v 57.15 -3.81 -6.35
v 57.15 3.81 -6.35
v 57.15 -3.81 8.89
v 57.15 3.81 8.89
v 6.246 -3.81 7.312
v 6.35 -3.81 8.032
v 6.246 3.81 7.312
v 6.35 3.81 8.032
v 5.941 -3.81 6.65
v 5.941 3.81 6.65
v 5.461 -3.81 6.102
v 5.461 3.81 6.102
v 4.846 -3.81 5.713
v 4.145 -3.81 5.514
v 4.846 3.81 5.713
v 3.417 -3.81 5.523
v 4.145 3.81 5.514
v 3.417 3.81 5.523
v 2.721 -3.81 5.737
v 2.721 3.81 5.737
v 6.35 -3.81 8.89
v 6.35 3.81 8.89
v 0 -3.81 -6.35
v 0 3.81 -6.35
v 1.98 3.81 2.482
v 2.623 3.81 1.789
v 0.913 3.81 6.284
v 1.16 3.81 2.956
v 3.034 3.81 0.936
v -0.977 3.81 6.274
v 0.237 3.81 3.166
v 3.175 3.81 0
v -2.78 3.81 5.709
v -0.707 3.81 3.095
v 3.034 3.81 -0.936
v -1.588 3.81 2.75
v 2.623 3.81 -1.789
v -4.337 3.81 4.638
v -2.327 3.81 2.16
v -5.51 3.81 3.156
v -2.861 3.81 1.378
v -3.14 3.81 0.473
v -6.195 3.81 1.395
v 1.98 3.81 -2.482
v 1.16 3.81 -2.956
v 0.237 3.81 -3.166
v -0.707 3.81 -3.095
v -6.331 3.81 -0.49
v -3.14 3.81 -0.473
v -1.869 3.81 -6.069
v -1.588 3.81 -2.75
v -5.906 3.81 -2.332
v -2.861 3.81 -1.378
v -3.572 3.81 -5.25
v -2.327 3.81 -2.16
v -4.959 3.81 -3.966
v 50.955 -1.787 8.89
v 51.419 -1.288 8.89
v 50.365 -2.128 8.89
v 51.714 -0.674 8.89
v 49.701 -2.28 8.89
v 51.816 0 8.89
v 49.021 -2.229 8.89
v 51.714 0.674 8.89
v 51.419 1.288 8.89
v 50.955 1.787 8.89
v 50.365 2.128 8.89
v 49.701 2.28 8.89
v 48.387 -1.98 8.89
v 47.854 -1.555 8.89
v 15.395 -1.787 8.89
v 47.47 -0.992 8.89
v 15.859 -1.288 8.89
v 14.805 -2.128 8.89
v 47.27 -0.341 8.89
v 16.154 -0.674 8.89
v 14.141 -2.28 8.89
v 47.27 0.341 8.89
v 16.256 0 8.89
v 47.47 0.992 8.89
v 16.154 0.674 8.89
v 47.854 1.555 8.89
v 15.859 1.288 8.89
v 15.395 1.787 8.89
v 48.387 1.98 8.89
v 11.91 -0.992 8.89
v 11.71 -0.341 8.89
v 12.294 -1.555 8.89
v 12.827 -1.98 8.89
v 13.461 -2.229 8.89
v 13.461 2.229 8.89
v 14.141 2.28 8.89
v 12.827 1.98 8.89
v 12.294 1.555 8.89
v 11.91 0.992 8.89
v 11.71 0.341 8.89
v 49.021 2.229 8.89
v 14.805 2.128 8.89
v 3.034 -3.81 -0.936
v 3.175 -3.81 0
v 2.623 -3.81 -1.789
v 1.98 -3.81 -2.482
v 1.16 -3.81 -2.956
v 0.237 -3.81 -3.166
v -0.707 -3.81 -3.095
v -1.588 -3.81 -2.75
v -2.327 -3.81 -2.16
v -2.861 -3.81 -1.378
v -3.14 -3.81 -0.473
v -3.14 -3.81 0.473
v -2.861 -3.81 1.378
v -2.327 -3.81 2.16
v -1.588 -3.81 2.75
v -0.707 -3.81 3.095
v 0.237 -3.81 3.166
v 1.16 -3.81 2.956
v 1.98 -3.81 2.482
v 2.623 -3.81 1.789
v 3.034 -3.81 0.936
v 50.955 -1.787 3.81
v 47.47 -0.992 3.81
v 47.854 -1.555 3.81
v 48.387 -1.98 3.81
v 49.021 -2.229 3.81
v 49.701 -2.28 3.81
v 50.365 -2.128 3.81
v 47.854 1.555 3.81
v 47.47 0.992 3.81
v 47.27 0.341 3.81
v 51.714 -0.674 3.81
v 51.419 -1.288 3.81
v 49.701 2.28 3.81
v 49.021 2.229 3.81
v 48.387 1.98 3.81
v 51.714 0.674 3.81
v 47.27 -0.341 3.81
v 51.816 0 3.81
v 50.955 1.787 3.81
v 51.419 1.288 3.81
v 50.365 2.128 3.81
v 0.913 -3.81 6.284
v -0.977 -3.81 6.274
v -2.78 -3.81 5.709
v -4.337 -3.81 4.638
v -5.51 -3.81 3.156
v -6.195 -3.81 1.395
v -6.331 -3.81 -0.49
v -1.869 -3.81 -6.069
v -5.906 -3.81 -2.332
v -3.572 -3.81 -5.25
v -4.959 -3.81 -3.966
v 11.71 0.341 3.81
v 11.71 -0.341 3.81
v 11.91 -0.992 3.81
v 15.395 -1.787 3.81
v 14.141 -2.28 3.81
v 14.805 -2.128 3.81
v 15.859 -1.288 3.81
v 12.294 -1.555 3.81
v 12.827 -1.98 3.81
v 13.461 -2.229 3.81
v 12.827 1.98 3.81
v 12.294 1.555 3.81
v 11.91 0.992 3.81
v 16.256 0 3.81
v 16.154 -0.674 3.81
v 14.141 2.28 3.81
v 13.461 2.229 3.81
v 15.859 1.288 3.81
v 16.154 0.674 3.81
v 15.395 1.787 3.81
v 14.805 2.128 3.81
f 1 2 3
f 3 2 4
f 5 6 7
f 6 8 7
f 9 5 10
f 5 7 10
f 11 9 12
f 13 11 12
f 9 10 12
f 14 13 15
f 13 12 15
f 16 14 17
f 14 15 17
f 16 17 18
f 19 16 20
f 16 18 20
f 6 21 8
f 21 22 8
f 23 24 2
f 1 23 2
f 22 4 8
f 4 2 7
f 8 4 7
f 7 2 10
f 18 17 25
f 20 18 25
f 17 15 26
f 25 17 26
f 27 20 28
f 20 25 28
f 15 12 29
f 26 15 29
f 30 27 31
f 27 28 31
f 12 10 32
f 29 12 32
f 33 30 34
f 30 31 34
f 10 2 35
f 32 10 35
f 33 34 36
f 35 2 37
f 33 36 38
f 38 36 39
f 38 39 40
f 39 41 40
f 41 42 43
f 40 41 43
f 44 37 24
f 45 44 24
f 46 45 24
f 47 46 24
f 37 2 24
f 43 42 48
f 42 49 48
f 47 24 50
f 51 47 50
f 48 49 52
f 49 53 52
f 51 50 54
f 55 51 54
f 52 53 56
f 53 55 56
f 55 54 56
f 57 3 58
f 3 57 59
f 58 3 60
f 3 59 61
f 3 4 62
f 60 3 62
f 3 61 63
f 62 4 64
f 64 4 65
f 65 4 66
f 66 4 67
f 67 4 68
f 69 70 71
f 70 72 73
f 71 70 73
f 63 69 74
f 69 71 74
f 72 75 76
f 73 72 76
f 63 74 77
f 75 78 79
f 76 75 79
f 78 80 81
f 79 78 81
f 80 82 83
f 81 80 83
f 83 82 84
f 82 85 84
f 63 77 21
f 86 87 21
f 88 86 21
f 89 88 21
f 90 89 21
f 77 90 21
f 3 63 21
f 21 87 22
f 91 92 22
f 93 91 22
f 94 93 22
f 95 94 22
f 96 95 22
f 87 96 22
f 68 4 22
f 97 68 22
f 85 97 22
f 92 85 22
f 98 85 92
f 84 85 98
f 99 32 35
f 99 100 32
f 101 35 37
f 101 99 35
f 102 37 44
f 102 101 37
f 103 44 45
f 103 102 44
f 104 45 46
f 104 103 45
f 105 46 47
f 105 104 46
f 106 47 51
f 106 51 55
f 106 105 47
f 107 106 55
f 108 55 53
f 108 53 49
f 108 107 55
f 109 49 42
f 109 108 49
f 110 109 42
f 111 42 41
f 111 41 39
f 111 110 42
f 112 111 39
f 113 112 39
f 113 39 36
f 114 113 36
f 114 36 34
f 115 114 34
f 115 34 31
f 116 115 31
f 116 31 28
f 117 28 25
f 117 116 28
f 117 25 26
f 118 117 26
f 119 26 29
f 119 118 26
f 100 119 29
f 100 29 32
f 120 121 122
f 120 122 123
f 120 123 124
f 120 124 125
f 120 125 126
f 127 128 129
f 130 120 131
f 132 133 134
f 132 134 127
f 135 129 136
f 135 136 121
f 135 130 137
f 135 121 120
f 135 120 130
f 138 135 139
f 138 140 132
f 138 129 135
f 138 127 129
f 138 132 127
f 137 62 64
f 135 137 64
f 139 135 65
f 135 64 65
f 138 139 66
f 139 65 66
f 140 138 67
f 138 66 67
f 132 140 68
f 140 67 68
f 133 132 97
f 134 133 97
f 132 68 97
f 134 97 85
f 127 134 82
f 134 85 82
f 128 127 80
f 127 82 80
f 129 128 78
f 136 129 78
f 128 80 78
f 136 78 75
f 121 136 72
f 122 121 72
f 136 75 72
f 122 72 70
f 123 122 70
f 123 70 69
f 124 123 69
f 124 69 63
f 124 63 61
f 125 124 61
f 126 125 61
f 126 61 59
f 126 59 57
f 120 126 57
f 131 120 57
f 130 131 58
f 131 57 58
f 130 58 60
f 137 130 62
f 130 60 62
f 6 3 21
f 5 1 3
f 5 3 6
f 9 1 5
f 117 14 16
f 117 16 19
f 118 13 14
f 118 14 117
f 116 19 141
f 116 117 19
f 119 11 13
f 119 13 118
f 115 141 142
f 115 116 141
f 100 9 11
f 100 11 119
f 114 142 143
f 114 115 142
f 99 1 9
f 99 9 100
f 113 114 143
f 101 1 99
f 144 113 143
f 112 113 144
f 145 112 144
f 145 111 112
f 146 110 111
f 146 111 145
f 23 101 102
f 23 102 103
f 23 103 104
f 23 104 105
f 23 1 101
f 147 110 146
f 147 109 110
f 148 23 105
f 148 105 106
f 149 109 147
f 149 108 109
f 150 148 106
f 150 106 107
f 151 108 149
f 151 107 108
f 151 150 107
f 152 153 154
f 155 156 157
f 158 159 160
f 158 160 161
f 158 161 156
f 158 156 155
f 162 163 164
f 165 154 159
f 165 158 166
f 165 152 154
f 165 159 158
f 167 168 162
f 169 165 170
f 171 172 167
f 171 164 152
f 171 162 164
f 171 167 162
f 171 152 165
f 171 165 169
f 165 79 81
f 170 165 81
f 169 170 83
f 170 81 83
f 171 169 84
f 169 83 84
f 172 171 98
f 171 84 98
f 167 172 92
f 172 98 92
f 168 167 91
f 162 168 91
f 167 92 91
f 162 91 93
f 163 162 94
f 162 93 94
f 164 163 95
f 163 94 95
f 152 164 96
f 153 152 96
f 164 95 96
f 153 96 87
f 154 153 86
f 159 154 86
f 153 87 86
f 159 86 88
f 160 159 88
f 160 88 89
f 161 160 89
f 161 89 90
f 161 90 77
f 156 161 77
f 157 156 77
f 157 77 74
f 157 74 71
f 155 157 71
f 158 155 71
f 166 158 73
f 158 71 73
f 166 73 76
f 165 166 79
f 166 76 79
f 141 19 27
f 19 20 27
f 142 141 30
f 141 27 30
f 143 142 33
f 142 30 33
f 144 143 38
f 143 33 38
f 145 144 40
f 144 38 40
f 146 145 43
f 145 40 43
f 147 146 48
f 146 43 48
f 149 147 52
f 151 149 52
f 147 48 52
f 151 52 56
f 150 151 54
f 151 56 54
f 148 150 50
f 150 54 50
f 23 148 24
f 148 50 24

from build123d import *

# Parameters (mm, degrees)
SKETCH1_R           = 3.175
BOSS_EXTRUDE1_DEPTH = 3.81
FILLET1_R           = 2.54
SKETCH2_R           = 2.286
SKETCH2_R_2         = 1.89865
CUT_EXTRUDE1_DEPTH  = 5.08


with BuildPart() as part:
    # Sketch1 → Boss-Extrude1 (new body, symmetric)
    with BuildSketch(Plane(origin=(0, 0, 0), x_dir=(1, 0, 0), z_dir=(0, 1, 0))):
        with BuildLine():
            Line((0, 6.35), (12.36646, 6.35))
            Line((12.36646, 6.35), (57.15, 6.35))
            Line((57.15, 6.35), (57.15, -8.89))
            Line((57.15, -8.89), (6.35, -8.89))
            Line((6.35, -8.89), (6.35, 0))
            ThreePointArc((6.35, 0), (-4.490128, -4.490128), (0, 6.35))
        make_face()
        Circle(SKETCH1_R, mode=Mode.SUBTRACT)
    extrude(amount=BOSS_EXTRUDE1_DEPTH, both=True)

    # Fillet1
    fillet1_edges = [part.edges().sort_by_distance(p)[0] for p in [
        (6.35, 0, 0),
    ]]
    fillet(fillet1_edges, radius=FILLET1_R)

    # Sketch2 → Cut-Extrude1 (cut)
    with BuildSketch(Plane.XY.offset(8.89)):
        with Locations((13.97, 0)):
            Circle(SKETCH2_R)
        with Locations((49.53, 0)):
            Circle(SKETCH2_R)
        with Locations((13.97, 0)):
            Circle(SKETCH2_R_2)
        with Locations((49.53, 0)):
            Circle(SKETCH2_R_2)
    extrude(amount=-CUT_EXTRUDE1_DEPTH, mode=Mode.SUBTRACT)


solid = part.part
